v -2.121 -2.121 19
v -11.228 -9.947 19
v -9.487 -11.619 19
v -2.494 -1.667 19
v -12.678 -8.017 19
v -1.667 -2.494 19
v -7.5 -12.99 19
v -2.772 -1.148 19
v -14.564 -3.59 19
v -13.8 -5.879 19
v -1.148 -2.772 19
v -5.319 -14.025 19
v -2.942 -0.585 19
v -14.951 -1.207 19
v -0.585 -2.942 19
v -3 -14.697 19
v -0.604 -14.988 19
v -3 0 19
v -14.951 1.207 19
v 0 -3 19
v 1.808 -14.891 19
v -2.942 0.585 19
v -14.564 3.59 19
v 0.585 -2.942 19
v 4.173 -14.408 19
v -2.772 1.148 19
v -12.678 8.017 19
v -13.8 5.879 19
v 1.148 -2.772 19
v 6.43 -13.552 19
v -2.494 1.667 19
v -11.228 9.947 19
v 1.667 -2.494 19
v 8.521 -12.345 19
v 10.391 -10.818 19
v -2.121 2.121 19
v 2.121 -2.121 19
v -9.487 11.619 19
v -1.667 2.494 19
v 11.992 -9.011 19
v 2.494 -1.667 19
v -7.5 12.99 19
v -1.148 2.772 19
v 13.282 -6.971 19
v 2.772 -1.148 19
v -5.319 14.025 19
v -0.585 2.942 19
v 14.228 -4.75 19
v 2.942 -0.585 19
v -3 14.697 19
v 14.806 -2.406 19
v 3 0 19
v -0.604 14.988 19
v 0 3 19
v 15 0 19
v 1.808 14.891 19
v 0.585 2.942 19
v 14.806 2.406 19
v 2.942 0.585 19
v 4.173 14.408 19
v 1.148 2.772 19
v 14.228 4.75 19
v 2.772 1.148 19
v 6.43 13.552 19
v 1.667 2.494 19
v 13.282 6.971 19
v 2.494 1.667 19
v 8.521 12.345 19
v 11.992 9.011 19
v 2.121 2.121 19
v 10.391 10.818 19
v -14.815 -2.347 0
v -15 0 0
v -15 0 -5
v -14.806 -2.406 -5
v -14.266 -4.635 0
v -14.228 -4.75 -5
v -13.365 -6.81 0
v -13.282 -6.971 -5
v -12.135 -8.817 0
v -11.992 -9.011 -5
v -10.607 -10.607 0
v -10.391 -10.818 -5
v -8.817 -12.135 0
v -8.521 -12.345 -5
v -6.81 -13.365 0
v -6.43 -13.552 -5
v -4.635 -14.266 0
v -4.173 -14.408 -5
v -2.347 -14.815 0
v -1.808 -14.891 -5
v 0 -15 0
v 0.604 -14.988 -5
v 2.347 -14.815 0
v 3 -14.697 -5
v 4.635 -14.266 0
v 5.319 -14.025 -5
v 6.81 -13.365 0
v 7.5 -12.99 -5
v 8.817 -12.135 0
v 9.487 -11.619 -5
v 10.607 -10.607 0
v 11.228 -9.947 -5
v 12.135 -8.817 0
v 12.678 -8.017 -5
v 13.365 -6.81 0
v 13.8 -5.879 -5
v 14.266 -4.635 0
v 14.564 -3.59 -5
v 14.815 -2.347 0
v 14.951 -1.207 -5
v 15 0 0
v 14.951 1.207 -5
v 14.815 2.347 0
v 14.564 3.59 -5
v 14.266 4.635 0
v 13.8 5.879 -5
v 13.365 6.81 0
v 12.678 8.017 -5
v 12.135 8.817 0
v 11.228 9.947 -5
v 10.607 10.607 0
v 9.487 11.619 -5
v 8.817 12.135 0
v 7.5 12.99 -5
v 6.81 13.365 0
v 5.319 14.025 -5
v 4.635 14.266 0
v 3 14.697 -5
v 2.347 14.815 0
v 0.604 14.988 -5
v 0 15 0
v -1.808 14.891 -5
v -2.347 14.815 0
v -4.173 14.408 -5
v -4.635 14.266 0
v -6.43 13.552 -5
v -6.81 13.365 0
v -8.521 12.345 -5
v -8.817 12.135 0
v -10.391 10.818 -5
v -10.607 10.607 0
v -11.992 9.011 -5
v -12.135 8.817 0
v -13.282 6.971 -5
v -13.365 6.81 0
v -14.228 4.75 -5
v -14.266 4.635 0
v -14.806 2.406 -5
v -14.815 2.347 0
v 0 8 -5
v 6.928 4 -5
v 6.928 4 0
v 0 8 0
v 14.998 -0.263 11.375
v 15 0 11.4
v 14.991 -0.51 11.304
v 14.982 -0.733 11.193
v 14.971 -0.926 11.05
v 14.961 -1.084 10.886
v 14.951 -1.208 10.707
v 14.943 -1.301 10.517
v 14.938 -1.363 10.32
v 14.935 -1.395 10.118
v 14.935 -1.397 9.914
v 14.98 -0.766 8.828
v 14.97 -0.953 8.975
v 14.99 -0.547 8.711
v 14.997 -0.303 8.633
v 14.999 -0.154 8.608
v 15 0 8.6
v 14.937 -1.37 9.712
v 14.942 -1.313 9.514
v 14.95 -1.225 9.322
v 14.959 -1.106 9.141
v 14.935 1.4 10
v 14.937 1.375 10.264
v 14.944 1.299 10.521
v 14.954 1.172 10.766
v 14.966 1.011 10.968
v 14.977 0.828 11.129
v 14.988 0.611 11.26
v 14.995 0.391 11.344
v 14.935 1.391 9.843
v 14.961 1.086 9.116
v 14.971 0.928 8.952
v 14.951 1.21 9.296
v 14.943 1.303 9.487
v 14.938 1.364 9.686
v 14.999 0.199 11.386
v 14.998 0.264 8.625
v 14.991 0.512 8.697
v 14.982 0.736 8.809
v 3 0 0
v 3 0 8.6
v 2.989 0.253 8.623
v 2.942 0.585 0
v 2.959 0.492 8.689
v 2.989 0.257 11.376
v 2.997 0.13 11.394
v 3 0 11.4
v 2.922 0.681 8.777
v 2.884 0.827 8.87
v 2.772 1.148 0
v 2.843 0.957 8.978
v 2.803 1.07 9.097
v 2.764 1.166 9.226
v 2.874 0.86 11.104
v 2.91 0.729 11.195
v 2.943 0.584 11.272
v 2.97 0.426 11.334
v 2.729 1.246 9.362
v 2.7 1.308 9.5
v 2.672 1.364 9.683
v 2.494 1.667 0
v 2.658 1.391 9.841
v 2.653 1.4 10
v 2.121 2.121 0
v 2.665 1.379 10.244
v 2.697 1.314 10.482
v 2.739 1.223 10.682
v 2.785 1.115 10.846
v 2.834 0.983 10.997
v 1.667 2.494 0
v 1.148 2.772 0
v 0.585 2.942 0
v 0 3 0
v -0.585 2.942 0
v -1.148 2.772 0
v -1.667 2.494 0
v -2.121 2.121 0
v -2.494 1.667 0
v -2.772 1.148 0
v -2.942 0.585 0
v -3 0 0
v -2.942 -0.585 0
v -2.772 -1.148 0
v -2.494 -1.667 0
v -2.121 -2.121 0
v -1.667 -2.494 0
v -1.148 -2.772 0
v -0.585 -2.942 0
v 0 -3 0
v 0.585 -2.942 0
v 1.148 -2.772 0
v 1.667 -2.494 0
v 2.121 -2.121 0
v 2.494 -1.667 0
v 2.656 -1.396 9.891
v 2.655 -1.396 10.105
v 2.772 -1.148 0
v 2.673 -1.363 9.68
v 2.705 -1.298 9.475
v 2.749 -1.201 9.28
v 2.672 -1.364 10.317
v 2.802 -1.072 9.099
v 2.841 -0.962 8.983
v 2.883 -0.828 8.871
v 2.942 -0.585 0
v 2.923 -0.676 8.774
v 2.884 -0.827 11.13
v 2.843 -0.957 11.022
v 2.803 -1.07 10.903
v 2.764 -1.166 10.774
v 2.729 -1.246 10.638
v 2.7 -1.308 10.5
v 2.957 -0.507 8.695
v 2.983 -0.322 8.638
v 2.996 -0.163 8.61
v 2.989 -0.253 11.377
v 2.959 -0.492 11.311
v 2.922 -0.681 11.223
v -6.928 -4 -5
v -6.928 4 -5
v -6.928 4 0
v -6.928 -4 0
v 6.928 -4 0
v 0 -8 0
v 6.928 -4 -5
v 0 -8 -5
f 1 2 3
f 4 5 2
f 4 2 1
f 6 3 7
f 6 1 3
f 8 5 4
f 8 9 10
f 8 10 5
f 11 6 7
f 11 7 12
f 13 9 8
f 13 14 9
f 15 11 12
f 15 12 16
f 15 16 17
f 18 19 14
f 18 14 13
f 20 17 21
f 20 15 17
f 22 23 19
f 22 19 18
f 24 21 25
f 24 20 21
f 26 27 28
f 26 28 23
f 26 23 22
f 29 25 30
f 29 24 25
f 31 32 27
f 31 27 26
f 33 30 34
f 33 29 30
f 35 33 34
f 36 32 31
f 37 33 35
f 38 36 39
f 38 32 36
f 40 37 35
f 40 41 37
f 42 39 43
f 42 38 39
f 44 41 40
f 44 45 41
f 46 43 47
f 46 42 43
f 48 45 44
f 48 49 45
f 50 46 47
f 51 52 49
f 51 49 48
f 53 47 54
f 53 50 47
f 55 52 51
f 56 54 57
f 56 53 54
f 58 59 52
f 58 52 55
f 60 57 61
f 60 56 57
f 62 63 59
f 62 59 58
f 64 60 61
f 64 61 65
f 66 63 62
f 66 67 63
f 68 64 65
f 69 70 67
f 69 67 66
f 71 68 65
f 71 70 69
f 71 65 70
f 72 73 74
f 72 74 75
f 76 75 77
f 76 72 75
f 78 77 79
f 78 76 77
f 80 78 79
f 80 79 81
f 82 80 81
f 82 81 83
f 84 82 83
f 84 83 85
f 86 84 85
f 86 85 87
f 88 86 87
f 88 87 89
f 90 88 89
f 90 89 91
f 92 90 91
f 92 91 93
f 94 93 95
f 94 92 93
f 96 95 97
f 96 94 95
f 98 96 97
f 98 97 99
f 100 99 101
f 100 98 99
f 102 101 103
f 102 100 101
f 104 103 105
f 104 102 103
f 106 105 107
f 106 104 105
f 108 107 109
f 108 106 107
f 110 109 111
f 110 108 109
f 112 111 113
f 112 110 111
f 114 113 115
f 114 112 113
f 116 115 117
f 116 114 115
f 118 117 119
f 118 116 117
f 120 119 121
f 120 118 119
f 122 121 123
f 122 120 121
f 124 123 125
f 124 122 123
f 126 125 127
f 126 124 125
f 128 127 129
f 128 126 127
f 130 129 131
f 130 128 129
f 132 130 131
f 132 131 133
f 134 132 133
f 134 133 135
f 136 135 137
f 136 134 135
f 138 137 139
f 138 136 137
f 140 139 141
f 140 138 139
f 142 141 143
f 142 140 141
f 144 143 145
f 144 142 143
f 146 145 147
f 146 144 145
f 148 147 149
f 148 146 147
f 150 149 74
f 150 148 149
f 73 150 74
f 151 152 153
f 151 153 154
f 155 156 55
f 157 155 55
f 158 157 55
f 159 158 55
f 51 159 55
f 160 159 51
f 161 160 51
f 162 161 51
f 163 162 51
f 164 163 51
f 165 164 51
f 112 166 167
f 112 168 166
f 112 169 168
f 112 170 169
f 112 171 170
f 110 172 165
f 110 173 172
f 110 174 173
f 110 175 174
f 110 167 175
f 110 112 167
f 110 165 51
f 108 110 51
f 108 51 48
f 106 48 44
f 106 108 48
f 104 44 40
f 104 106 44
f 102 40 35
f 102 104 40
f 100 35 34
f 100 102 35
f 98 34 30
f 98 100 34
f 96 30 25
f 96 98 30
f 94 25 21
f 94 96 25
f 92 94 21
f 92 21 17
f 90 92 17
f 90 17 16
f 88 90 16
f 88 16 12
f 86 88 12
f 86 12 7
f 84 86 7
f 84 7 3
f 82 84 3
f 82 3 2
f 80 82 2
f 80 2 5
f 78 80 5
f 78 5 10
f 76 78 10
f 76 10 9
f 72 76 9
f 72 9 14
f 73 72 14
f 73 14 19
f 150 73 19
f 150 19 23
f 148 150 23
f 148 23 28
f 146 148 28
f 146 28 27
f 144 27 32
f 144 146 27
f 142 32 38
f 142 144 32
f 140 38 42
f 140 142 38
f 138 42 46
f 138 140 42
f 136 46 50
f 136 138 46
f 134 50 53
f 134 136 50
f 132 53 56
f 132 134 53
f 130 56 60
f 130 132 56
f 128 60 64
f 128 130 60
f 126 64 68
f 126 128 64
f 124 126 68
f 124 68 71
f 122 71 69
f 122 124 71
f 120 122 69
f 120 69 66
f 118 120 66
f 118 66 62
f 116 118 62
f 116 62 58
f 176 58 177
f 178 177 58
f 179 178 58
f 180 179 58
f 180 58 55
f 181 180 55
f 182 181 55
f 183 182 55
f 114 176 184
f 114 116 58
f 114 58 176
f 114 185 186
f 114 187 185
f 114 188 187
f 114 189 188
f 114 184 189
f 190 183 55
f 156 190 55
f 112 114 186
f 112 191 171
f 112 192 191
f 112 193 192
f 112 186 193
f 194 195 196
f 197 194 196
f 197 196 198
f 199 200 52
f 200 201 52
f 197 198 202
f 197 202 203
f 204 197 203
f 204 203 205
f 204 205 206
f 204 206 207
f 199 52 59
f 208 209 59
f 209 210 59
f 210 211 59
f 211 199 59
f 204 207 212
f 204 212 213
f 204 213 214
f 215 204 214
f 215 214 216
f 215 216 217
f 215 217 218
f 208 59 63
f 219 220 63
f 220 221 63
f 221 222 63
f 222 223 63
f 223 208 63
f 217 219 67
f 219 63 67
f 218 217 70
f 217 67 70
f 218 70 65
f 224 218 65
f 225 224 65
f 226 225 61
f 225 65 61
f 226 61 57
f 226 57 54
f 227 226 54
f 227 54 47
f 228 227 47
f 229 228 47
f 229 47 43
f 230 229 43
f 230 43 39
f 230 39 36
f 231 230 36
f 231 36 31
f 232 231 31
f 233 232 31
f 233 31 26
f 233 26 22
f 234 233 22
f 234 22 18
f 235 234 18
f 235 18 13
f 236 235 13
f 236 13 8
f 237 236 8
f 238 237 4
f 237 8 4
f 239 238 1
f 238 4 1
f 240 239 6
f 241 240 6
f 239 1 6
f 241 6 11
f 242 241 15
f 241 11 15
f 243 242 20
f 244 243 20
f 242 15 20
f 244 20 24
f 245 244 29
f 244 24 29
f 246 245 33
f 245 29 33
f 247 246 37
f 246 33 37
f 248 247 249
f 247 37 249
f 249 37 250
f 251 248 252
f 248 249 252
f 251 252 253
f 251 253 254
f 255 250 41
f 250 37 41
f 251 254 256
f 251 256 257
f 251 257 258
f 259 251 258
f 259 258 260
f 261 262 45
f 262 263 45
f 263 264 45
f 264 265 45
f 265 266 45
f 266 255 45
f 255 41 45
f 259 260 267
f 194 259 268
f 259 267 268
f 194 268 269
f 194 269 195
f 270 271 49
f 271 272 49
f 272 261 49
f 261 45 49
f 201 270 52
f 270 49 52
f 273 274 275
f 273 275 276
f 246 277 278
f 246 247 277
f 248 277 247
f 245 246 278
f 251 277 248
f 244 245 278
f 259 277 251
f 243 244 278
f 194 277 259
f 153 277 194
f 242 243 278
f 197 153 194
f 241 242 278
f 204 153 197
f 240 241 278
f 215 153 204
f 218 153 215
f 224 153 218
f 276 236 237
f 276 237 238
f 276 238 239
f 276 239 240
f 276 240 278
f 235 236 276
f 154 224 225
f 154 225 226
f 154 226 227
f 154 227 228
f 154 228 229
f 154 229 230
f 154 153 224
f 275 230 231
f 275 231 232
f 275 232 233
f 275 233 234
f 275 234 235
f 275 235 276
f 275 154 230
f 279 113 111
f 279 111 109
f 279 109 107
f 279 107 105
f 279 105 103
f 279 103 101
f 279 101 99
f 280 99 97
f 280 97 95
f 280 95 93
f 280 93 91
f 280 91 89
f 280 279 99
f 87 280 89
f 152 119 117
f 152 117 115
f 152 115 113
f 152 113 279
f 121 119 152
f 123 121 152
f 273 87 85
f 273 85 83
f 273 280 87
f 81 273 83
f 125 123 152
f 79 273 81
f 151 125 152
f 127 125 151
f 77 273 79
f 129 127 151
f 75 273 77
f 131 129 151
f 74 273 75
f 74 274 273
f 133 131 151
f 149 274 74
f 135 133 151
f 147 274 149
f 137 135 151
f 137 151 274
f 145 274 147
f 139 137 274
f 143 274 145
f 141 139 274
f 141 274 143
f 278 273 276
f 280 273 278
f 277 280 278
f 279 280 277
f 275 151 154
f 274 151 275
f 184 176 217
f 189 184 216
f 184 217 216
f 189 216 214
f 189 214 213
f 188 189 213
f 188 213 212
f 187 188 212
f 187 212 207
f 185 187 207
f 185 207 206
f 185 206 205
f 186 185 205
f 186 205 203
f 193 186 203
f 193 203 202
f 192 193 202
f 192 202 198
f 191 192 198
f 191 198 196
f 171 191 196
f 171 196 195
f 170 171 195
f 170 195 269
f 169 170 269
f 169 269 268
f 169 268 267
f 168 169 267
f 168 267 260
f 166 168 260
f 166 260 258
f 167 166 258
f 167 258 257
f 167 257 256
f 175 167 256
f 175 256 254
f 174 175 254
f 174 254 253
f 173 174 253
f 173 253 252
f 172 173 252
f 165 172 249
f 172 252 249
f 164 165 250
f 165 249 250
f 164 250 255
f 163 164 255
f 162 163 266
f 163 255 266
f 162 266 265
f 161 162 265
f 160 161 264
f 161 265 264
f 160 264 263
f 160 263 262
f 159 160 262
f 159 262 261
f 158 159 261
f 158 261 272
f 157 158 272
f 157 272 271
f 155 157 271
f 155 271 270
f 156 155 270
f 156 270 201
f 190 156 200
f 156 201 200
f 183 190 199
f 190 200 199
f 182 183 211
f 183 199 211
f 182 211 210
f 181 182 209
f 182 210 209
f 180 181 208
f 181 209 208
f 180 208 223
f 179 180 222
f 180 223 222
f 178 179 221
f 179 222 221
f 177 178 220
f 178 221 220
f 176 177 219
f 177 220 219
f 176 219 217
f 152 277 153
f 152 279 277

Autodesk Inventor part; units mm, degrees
ref_plane "YZ Plane" through (0, 0, 0) normal (1, 0, 0) x (0, 1, 0)
ref_plane "XZ Plane" through (0, 0, 0) normal (0, 1, 0) x (-1, 0, 0)
ref_plane "XY Plane" through (0, 0, 0) normal (0, 0, 1) x (1, 0, 0)
sketch "Sketch1" plane through (0, 0, 0) normal (0, 0, 1) x (1, 0, 0)
  circle A0 centre (0, 0) radius 15
  dimension "d0" = 30
extrude "Extrusion1" add sketch "Sketch1" along normal blind 19
sketch "Sketch2" plane through (0, 0, 19) normal (0, 0, 1) x (1, 0, 0)
  circle A0 centre (0, 0) radius 3
  dimension "d3" = 6
extrude "Extrusion2" cut sketch "Sketch2" against normal blind 19
sketch "Sketch3" plane through (0, 0, 0) normal (0, 0, -1) x (-1, 0, 0)
  circle A0 centre (0, 0) radius 15 projected
extrude "Extrusion3" add sketch "Sketch3" along normal blind 5
sketch "Sketch6" plane through (0, 0, -5) normal (0, 0, -1) x (-1, 0, 0)
  line L0 (0, -8) -> (-6.9282, -4)
  line L1 (-6.9282, -4) -> (-6.9282, 4)
  line L2 (-6.9282, 4) -> (0, 8)
  line L3 (0, 8) -> (6.9282, 4)
  line L4 (6.9282, 4) -> (6.9282, -4)
  line L5 (6.9282, -4) -> (0, -8)
  point P0 (0, 0)
  point P1 (0, 0)
  dimension "d15" = 16
extrude "Extrusion6" cut sketch "Sketch6" against normal blind 5
sketch "Sketch7" plane through (0, 0, 0) normal (1, 0, 0) x (0, 1, 0)
  circle A0 centre (0, 10) radius 1.4
  point P0 (0, 0)
  dimension "d18" = 2.8
  dimension "d19" = 10
extrude "Extrusion7" cut sketch "Sketch7" along normal through all
properties part number "FA012" material "ABS Plastic"
